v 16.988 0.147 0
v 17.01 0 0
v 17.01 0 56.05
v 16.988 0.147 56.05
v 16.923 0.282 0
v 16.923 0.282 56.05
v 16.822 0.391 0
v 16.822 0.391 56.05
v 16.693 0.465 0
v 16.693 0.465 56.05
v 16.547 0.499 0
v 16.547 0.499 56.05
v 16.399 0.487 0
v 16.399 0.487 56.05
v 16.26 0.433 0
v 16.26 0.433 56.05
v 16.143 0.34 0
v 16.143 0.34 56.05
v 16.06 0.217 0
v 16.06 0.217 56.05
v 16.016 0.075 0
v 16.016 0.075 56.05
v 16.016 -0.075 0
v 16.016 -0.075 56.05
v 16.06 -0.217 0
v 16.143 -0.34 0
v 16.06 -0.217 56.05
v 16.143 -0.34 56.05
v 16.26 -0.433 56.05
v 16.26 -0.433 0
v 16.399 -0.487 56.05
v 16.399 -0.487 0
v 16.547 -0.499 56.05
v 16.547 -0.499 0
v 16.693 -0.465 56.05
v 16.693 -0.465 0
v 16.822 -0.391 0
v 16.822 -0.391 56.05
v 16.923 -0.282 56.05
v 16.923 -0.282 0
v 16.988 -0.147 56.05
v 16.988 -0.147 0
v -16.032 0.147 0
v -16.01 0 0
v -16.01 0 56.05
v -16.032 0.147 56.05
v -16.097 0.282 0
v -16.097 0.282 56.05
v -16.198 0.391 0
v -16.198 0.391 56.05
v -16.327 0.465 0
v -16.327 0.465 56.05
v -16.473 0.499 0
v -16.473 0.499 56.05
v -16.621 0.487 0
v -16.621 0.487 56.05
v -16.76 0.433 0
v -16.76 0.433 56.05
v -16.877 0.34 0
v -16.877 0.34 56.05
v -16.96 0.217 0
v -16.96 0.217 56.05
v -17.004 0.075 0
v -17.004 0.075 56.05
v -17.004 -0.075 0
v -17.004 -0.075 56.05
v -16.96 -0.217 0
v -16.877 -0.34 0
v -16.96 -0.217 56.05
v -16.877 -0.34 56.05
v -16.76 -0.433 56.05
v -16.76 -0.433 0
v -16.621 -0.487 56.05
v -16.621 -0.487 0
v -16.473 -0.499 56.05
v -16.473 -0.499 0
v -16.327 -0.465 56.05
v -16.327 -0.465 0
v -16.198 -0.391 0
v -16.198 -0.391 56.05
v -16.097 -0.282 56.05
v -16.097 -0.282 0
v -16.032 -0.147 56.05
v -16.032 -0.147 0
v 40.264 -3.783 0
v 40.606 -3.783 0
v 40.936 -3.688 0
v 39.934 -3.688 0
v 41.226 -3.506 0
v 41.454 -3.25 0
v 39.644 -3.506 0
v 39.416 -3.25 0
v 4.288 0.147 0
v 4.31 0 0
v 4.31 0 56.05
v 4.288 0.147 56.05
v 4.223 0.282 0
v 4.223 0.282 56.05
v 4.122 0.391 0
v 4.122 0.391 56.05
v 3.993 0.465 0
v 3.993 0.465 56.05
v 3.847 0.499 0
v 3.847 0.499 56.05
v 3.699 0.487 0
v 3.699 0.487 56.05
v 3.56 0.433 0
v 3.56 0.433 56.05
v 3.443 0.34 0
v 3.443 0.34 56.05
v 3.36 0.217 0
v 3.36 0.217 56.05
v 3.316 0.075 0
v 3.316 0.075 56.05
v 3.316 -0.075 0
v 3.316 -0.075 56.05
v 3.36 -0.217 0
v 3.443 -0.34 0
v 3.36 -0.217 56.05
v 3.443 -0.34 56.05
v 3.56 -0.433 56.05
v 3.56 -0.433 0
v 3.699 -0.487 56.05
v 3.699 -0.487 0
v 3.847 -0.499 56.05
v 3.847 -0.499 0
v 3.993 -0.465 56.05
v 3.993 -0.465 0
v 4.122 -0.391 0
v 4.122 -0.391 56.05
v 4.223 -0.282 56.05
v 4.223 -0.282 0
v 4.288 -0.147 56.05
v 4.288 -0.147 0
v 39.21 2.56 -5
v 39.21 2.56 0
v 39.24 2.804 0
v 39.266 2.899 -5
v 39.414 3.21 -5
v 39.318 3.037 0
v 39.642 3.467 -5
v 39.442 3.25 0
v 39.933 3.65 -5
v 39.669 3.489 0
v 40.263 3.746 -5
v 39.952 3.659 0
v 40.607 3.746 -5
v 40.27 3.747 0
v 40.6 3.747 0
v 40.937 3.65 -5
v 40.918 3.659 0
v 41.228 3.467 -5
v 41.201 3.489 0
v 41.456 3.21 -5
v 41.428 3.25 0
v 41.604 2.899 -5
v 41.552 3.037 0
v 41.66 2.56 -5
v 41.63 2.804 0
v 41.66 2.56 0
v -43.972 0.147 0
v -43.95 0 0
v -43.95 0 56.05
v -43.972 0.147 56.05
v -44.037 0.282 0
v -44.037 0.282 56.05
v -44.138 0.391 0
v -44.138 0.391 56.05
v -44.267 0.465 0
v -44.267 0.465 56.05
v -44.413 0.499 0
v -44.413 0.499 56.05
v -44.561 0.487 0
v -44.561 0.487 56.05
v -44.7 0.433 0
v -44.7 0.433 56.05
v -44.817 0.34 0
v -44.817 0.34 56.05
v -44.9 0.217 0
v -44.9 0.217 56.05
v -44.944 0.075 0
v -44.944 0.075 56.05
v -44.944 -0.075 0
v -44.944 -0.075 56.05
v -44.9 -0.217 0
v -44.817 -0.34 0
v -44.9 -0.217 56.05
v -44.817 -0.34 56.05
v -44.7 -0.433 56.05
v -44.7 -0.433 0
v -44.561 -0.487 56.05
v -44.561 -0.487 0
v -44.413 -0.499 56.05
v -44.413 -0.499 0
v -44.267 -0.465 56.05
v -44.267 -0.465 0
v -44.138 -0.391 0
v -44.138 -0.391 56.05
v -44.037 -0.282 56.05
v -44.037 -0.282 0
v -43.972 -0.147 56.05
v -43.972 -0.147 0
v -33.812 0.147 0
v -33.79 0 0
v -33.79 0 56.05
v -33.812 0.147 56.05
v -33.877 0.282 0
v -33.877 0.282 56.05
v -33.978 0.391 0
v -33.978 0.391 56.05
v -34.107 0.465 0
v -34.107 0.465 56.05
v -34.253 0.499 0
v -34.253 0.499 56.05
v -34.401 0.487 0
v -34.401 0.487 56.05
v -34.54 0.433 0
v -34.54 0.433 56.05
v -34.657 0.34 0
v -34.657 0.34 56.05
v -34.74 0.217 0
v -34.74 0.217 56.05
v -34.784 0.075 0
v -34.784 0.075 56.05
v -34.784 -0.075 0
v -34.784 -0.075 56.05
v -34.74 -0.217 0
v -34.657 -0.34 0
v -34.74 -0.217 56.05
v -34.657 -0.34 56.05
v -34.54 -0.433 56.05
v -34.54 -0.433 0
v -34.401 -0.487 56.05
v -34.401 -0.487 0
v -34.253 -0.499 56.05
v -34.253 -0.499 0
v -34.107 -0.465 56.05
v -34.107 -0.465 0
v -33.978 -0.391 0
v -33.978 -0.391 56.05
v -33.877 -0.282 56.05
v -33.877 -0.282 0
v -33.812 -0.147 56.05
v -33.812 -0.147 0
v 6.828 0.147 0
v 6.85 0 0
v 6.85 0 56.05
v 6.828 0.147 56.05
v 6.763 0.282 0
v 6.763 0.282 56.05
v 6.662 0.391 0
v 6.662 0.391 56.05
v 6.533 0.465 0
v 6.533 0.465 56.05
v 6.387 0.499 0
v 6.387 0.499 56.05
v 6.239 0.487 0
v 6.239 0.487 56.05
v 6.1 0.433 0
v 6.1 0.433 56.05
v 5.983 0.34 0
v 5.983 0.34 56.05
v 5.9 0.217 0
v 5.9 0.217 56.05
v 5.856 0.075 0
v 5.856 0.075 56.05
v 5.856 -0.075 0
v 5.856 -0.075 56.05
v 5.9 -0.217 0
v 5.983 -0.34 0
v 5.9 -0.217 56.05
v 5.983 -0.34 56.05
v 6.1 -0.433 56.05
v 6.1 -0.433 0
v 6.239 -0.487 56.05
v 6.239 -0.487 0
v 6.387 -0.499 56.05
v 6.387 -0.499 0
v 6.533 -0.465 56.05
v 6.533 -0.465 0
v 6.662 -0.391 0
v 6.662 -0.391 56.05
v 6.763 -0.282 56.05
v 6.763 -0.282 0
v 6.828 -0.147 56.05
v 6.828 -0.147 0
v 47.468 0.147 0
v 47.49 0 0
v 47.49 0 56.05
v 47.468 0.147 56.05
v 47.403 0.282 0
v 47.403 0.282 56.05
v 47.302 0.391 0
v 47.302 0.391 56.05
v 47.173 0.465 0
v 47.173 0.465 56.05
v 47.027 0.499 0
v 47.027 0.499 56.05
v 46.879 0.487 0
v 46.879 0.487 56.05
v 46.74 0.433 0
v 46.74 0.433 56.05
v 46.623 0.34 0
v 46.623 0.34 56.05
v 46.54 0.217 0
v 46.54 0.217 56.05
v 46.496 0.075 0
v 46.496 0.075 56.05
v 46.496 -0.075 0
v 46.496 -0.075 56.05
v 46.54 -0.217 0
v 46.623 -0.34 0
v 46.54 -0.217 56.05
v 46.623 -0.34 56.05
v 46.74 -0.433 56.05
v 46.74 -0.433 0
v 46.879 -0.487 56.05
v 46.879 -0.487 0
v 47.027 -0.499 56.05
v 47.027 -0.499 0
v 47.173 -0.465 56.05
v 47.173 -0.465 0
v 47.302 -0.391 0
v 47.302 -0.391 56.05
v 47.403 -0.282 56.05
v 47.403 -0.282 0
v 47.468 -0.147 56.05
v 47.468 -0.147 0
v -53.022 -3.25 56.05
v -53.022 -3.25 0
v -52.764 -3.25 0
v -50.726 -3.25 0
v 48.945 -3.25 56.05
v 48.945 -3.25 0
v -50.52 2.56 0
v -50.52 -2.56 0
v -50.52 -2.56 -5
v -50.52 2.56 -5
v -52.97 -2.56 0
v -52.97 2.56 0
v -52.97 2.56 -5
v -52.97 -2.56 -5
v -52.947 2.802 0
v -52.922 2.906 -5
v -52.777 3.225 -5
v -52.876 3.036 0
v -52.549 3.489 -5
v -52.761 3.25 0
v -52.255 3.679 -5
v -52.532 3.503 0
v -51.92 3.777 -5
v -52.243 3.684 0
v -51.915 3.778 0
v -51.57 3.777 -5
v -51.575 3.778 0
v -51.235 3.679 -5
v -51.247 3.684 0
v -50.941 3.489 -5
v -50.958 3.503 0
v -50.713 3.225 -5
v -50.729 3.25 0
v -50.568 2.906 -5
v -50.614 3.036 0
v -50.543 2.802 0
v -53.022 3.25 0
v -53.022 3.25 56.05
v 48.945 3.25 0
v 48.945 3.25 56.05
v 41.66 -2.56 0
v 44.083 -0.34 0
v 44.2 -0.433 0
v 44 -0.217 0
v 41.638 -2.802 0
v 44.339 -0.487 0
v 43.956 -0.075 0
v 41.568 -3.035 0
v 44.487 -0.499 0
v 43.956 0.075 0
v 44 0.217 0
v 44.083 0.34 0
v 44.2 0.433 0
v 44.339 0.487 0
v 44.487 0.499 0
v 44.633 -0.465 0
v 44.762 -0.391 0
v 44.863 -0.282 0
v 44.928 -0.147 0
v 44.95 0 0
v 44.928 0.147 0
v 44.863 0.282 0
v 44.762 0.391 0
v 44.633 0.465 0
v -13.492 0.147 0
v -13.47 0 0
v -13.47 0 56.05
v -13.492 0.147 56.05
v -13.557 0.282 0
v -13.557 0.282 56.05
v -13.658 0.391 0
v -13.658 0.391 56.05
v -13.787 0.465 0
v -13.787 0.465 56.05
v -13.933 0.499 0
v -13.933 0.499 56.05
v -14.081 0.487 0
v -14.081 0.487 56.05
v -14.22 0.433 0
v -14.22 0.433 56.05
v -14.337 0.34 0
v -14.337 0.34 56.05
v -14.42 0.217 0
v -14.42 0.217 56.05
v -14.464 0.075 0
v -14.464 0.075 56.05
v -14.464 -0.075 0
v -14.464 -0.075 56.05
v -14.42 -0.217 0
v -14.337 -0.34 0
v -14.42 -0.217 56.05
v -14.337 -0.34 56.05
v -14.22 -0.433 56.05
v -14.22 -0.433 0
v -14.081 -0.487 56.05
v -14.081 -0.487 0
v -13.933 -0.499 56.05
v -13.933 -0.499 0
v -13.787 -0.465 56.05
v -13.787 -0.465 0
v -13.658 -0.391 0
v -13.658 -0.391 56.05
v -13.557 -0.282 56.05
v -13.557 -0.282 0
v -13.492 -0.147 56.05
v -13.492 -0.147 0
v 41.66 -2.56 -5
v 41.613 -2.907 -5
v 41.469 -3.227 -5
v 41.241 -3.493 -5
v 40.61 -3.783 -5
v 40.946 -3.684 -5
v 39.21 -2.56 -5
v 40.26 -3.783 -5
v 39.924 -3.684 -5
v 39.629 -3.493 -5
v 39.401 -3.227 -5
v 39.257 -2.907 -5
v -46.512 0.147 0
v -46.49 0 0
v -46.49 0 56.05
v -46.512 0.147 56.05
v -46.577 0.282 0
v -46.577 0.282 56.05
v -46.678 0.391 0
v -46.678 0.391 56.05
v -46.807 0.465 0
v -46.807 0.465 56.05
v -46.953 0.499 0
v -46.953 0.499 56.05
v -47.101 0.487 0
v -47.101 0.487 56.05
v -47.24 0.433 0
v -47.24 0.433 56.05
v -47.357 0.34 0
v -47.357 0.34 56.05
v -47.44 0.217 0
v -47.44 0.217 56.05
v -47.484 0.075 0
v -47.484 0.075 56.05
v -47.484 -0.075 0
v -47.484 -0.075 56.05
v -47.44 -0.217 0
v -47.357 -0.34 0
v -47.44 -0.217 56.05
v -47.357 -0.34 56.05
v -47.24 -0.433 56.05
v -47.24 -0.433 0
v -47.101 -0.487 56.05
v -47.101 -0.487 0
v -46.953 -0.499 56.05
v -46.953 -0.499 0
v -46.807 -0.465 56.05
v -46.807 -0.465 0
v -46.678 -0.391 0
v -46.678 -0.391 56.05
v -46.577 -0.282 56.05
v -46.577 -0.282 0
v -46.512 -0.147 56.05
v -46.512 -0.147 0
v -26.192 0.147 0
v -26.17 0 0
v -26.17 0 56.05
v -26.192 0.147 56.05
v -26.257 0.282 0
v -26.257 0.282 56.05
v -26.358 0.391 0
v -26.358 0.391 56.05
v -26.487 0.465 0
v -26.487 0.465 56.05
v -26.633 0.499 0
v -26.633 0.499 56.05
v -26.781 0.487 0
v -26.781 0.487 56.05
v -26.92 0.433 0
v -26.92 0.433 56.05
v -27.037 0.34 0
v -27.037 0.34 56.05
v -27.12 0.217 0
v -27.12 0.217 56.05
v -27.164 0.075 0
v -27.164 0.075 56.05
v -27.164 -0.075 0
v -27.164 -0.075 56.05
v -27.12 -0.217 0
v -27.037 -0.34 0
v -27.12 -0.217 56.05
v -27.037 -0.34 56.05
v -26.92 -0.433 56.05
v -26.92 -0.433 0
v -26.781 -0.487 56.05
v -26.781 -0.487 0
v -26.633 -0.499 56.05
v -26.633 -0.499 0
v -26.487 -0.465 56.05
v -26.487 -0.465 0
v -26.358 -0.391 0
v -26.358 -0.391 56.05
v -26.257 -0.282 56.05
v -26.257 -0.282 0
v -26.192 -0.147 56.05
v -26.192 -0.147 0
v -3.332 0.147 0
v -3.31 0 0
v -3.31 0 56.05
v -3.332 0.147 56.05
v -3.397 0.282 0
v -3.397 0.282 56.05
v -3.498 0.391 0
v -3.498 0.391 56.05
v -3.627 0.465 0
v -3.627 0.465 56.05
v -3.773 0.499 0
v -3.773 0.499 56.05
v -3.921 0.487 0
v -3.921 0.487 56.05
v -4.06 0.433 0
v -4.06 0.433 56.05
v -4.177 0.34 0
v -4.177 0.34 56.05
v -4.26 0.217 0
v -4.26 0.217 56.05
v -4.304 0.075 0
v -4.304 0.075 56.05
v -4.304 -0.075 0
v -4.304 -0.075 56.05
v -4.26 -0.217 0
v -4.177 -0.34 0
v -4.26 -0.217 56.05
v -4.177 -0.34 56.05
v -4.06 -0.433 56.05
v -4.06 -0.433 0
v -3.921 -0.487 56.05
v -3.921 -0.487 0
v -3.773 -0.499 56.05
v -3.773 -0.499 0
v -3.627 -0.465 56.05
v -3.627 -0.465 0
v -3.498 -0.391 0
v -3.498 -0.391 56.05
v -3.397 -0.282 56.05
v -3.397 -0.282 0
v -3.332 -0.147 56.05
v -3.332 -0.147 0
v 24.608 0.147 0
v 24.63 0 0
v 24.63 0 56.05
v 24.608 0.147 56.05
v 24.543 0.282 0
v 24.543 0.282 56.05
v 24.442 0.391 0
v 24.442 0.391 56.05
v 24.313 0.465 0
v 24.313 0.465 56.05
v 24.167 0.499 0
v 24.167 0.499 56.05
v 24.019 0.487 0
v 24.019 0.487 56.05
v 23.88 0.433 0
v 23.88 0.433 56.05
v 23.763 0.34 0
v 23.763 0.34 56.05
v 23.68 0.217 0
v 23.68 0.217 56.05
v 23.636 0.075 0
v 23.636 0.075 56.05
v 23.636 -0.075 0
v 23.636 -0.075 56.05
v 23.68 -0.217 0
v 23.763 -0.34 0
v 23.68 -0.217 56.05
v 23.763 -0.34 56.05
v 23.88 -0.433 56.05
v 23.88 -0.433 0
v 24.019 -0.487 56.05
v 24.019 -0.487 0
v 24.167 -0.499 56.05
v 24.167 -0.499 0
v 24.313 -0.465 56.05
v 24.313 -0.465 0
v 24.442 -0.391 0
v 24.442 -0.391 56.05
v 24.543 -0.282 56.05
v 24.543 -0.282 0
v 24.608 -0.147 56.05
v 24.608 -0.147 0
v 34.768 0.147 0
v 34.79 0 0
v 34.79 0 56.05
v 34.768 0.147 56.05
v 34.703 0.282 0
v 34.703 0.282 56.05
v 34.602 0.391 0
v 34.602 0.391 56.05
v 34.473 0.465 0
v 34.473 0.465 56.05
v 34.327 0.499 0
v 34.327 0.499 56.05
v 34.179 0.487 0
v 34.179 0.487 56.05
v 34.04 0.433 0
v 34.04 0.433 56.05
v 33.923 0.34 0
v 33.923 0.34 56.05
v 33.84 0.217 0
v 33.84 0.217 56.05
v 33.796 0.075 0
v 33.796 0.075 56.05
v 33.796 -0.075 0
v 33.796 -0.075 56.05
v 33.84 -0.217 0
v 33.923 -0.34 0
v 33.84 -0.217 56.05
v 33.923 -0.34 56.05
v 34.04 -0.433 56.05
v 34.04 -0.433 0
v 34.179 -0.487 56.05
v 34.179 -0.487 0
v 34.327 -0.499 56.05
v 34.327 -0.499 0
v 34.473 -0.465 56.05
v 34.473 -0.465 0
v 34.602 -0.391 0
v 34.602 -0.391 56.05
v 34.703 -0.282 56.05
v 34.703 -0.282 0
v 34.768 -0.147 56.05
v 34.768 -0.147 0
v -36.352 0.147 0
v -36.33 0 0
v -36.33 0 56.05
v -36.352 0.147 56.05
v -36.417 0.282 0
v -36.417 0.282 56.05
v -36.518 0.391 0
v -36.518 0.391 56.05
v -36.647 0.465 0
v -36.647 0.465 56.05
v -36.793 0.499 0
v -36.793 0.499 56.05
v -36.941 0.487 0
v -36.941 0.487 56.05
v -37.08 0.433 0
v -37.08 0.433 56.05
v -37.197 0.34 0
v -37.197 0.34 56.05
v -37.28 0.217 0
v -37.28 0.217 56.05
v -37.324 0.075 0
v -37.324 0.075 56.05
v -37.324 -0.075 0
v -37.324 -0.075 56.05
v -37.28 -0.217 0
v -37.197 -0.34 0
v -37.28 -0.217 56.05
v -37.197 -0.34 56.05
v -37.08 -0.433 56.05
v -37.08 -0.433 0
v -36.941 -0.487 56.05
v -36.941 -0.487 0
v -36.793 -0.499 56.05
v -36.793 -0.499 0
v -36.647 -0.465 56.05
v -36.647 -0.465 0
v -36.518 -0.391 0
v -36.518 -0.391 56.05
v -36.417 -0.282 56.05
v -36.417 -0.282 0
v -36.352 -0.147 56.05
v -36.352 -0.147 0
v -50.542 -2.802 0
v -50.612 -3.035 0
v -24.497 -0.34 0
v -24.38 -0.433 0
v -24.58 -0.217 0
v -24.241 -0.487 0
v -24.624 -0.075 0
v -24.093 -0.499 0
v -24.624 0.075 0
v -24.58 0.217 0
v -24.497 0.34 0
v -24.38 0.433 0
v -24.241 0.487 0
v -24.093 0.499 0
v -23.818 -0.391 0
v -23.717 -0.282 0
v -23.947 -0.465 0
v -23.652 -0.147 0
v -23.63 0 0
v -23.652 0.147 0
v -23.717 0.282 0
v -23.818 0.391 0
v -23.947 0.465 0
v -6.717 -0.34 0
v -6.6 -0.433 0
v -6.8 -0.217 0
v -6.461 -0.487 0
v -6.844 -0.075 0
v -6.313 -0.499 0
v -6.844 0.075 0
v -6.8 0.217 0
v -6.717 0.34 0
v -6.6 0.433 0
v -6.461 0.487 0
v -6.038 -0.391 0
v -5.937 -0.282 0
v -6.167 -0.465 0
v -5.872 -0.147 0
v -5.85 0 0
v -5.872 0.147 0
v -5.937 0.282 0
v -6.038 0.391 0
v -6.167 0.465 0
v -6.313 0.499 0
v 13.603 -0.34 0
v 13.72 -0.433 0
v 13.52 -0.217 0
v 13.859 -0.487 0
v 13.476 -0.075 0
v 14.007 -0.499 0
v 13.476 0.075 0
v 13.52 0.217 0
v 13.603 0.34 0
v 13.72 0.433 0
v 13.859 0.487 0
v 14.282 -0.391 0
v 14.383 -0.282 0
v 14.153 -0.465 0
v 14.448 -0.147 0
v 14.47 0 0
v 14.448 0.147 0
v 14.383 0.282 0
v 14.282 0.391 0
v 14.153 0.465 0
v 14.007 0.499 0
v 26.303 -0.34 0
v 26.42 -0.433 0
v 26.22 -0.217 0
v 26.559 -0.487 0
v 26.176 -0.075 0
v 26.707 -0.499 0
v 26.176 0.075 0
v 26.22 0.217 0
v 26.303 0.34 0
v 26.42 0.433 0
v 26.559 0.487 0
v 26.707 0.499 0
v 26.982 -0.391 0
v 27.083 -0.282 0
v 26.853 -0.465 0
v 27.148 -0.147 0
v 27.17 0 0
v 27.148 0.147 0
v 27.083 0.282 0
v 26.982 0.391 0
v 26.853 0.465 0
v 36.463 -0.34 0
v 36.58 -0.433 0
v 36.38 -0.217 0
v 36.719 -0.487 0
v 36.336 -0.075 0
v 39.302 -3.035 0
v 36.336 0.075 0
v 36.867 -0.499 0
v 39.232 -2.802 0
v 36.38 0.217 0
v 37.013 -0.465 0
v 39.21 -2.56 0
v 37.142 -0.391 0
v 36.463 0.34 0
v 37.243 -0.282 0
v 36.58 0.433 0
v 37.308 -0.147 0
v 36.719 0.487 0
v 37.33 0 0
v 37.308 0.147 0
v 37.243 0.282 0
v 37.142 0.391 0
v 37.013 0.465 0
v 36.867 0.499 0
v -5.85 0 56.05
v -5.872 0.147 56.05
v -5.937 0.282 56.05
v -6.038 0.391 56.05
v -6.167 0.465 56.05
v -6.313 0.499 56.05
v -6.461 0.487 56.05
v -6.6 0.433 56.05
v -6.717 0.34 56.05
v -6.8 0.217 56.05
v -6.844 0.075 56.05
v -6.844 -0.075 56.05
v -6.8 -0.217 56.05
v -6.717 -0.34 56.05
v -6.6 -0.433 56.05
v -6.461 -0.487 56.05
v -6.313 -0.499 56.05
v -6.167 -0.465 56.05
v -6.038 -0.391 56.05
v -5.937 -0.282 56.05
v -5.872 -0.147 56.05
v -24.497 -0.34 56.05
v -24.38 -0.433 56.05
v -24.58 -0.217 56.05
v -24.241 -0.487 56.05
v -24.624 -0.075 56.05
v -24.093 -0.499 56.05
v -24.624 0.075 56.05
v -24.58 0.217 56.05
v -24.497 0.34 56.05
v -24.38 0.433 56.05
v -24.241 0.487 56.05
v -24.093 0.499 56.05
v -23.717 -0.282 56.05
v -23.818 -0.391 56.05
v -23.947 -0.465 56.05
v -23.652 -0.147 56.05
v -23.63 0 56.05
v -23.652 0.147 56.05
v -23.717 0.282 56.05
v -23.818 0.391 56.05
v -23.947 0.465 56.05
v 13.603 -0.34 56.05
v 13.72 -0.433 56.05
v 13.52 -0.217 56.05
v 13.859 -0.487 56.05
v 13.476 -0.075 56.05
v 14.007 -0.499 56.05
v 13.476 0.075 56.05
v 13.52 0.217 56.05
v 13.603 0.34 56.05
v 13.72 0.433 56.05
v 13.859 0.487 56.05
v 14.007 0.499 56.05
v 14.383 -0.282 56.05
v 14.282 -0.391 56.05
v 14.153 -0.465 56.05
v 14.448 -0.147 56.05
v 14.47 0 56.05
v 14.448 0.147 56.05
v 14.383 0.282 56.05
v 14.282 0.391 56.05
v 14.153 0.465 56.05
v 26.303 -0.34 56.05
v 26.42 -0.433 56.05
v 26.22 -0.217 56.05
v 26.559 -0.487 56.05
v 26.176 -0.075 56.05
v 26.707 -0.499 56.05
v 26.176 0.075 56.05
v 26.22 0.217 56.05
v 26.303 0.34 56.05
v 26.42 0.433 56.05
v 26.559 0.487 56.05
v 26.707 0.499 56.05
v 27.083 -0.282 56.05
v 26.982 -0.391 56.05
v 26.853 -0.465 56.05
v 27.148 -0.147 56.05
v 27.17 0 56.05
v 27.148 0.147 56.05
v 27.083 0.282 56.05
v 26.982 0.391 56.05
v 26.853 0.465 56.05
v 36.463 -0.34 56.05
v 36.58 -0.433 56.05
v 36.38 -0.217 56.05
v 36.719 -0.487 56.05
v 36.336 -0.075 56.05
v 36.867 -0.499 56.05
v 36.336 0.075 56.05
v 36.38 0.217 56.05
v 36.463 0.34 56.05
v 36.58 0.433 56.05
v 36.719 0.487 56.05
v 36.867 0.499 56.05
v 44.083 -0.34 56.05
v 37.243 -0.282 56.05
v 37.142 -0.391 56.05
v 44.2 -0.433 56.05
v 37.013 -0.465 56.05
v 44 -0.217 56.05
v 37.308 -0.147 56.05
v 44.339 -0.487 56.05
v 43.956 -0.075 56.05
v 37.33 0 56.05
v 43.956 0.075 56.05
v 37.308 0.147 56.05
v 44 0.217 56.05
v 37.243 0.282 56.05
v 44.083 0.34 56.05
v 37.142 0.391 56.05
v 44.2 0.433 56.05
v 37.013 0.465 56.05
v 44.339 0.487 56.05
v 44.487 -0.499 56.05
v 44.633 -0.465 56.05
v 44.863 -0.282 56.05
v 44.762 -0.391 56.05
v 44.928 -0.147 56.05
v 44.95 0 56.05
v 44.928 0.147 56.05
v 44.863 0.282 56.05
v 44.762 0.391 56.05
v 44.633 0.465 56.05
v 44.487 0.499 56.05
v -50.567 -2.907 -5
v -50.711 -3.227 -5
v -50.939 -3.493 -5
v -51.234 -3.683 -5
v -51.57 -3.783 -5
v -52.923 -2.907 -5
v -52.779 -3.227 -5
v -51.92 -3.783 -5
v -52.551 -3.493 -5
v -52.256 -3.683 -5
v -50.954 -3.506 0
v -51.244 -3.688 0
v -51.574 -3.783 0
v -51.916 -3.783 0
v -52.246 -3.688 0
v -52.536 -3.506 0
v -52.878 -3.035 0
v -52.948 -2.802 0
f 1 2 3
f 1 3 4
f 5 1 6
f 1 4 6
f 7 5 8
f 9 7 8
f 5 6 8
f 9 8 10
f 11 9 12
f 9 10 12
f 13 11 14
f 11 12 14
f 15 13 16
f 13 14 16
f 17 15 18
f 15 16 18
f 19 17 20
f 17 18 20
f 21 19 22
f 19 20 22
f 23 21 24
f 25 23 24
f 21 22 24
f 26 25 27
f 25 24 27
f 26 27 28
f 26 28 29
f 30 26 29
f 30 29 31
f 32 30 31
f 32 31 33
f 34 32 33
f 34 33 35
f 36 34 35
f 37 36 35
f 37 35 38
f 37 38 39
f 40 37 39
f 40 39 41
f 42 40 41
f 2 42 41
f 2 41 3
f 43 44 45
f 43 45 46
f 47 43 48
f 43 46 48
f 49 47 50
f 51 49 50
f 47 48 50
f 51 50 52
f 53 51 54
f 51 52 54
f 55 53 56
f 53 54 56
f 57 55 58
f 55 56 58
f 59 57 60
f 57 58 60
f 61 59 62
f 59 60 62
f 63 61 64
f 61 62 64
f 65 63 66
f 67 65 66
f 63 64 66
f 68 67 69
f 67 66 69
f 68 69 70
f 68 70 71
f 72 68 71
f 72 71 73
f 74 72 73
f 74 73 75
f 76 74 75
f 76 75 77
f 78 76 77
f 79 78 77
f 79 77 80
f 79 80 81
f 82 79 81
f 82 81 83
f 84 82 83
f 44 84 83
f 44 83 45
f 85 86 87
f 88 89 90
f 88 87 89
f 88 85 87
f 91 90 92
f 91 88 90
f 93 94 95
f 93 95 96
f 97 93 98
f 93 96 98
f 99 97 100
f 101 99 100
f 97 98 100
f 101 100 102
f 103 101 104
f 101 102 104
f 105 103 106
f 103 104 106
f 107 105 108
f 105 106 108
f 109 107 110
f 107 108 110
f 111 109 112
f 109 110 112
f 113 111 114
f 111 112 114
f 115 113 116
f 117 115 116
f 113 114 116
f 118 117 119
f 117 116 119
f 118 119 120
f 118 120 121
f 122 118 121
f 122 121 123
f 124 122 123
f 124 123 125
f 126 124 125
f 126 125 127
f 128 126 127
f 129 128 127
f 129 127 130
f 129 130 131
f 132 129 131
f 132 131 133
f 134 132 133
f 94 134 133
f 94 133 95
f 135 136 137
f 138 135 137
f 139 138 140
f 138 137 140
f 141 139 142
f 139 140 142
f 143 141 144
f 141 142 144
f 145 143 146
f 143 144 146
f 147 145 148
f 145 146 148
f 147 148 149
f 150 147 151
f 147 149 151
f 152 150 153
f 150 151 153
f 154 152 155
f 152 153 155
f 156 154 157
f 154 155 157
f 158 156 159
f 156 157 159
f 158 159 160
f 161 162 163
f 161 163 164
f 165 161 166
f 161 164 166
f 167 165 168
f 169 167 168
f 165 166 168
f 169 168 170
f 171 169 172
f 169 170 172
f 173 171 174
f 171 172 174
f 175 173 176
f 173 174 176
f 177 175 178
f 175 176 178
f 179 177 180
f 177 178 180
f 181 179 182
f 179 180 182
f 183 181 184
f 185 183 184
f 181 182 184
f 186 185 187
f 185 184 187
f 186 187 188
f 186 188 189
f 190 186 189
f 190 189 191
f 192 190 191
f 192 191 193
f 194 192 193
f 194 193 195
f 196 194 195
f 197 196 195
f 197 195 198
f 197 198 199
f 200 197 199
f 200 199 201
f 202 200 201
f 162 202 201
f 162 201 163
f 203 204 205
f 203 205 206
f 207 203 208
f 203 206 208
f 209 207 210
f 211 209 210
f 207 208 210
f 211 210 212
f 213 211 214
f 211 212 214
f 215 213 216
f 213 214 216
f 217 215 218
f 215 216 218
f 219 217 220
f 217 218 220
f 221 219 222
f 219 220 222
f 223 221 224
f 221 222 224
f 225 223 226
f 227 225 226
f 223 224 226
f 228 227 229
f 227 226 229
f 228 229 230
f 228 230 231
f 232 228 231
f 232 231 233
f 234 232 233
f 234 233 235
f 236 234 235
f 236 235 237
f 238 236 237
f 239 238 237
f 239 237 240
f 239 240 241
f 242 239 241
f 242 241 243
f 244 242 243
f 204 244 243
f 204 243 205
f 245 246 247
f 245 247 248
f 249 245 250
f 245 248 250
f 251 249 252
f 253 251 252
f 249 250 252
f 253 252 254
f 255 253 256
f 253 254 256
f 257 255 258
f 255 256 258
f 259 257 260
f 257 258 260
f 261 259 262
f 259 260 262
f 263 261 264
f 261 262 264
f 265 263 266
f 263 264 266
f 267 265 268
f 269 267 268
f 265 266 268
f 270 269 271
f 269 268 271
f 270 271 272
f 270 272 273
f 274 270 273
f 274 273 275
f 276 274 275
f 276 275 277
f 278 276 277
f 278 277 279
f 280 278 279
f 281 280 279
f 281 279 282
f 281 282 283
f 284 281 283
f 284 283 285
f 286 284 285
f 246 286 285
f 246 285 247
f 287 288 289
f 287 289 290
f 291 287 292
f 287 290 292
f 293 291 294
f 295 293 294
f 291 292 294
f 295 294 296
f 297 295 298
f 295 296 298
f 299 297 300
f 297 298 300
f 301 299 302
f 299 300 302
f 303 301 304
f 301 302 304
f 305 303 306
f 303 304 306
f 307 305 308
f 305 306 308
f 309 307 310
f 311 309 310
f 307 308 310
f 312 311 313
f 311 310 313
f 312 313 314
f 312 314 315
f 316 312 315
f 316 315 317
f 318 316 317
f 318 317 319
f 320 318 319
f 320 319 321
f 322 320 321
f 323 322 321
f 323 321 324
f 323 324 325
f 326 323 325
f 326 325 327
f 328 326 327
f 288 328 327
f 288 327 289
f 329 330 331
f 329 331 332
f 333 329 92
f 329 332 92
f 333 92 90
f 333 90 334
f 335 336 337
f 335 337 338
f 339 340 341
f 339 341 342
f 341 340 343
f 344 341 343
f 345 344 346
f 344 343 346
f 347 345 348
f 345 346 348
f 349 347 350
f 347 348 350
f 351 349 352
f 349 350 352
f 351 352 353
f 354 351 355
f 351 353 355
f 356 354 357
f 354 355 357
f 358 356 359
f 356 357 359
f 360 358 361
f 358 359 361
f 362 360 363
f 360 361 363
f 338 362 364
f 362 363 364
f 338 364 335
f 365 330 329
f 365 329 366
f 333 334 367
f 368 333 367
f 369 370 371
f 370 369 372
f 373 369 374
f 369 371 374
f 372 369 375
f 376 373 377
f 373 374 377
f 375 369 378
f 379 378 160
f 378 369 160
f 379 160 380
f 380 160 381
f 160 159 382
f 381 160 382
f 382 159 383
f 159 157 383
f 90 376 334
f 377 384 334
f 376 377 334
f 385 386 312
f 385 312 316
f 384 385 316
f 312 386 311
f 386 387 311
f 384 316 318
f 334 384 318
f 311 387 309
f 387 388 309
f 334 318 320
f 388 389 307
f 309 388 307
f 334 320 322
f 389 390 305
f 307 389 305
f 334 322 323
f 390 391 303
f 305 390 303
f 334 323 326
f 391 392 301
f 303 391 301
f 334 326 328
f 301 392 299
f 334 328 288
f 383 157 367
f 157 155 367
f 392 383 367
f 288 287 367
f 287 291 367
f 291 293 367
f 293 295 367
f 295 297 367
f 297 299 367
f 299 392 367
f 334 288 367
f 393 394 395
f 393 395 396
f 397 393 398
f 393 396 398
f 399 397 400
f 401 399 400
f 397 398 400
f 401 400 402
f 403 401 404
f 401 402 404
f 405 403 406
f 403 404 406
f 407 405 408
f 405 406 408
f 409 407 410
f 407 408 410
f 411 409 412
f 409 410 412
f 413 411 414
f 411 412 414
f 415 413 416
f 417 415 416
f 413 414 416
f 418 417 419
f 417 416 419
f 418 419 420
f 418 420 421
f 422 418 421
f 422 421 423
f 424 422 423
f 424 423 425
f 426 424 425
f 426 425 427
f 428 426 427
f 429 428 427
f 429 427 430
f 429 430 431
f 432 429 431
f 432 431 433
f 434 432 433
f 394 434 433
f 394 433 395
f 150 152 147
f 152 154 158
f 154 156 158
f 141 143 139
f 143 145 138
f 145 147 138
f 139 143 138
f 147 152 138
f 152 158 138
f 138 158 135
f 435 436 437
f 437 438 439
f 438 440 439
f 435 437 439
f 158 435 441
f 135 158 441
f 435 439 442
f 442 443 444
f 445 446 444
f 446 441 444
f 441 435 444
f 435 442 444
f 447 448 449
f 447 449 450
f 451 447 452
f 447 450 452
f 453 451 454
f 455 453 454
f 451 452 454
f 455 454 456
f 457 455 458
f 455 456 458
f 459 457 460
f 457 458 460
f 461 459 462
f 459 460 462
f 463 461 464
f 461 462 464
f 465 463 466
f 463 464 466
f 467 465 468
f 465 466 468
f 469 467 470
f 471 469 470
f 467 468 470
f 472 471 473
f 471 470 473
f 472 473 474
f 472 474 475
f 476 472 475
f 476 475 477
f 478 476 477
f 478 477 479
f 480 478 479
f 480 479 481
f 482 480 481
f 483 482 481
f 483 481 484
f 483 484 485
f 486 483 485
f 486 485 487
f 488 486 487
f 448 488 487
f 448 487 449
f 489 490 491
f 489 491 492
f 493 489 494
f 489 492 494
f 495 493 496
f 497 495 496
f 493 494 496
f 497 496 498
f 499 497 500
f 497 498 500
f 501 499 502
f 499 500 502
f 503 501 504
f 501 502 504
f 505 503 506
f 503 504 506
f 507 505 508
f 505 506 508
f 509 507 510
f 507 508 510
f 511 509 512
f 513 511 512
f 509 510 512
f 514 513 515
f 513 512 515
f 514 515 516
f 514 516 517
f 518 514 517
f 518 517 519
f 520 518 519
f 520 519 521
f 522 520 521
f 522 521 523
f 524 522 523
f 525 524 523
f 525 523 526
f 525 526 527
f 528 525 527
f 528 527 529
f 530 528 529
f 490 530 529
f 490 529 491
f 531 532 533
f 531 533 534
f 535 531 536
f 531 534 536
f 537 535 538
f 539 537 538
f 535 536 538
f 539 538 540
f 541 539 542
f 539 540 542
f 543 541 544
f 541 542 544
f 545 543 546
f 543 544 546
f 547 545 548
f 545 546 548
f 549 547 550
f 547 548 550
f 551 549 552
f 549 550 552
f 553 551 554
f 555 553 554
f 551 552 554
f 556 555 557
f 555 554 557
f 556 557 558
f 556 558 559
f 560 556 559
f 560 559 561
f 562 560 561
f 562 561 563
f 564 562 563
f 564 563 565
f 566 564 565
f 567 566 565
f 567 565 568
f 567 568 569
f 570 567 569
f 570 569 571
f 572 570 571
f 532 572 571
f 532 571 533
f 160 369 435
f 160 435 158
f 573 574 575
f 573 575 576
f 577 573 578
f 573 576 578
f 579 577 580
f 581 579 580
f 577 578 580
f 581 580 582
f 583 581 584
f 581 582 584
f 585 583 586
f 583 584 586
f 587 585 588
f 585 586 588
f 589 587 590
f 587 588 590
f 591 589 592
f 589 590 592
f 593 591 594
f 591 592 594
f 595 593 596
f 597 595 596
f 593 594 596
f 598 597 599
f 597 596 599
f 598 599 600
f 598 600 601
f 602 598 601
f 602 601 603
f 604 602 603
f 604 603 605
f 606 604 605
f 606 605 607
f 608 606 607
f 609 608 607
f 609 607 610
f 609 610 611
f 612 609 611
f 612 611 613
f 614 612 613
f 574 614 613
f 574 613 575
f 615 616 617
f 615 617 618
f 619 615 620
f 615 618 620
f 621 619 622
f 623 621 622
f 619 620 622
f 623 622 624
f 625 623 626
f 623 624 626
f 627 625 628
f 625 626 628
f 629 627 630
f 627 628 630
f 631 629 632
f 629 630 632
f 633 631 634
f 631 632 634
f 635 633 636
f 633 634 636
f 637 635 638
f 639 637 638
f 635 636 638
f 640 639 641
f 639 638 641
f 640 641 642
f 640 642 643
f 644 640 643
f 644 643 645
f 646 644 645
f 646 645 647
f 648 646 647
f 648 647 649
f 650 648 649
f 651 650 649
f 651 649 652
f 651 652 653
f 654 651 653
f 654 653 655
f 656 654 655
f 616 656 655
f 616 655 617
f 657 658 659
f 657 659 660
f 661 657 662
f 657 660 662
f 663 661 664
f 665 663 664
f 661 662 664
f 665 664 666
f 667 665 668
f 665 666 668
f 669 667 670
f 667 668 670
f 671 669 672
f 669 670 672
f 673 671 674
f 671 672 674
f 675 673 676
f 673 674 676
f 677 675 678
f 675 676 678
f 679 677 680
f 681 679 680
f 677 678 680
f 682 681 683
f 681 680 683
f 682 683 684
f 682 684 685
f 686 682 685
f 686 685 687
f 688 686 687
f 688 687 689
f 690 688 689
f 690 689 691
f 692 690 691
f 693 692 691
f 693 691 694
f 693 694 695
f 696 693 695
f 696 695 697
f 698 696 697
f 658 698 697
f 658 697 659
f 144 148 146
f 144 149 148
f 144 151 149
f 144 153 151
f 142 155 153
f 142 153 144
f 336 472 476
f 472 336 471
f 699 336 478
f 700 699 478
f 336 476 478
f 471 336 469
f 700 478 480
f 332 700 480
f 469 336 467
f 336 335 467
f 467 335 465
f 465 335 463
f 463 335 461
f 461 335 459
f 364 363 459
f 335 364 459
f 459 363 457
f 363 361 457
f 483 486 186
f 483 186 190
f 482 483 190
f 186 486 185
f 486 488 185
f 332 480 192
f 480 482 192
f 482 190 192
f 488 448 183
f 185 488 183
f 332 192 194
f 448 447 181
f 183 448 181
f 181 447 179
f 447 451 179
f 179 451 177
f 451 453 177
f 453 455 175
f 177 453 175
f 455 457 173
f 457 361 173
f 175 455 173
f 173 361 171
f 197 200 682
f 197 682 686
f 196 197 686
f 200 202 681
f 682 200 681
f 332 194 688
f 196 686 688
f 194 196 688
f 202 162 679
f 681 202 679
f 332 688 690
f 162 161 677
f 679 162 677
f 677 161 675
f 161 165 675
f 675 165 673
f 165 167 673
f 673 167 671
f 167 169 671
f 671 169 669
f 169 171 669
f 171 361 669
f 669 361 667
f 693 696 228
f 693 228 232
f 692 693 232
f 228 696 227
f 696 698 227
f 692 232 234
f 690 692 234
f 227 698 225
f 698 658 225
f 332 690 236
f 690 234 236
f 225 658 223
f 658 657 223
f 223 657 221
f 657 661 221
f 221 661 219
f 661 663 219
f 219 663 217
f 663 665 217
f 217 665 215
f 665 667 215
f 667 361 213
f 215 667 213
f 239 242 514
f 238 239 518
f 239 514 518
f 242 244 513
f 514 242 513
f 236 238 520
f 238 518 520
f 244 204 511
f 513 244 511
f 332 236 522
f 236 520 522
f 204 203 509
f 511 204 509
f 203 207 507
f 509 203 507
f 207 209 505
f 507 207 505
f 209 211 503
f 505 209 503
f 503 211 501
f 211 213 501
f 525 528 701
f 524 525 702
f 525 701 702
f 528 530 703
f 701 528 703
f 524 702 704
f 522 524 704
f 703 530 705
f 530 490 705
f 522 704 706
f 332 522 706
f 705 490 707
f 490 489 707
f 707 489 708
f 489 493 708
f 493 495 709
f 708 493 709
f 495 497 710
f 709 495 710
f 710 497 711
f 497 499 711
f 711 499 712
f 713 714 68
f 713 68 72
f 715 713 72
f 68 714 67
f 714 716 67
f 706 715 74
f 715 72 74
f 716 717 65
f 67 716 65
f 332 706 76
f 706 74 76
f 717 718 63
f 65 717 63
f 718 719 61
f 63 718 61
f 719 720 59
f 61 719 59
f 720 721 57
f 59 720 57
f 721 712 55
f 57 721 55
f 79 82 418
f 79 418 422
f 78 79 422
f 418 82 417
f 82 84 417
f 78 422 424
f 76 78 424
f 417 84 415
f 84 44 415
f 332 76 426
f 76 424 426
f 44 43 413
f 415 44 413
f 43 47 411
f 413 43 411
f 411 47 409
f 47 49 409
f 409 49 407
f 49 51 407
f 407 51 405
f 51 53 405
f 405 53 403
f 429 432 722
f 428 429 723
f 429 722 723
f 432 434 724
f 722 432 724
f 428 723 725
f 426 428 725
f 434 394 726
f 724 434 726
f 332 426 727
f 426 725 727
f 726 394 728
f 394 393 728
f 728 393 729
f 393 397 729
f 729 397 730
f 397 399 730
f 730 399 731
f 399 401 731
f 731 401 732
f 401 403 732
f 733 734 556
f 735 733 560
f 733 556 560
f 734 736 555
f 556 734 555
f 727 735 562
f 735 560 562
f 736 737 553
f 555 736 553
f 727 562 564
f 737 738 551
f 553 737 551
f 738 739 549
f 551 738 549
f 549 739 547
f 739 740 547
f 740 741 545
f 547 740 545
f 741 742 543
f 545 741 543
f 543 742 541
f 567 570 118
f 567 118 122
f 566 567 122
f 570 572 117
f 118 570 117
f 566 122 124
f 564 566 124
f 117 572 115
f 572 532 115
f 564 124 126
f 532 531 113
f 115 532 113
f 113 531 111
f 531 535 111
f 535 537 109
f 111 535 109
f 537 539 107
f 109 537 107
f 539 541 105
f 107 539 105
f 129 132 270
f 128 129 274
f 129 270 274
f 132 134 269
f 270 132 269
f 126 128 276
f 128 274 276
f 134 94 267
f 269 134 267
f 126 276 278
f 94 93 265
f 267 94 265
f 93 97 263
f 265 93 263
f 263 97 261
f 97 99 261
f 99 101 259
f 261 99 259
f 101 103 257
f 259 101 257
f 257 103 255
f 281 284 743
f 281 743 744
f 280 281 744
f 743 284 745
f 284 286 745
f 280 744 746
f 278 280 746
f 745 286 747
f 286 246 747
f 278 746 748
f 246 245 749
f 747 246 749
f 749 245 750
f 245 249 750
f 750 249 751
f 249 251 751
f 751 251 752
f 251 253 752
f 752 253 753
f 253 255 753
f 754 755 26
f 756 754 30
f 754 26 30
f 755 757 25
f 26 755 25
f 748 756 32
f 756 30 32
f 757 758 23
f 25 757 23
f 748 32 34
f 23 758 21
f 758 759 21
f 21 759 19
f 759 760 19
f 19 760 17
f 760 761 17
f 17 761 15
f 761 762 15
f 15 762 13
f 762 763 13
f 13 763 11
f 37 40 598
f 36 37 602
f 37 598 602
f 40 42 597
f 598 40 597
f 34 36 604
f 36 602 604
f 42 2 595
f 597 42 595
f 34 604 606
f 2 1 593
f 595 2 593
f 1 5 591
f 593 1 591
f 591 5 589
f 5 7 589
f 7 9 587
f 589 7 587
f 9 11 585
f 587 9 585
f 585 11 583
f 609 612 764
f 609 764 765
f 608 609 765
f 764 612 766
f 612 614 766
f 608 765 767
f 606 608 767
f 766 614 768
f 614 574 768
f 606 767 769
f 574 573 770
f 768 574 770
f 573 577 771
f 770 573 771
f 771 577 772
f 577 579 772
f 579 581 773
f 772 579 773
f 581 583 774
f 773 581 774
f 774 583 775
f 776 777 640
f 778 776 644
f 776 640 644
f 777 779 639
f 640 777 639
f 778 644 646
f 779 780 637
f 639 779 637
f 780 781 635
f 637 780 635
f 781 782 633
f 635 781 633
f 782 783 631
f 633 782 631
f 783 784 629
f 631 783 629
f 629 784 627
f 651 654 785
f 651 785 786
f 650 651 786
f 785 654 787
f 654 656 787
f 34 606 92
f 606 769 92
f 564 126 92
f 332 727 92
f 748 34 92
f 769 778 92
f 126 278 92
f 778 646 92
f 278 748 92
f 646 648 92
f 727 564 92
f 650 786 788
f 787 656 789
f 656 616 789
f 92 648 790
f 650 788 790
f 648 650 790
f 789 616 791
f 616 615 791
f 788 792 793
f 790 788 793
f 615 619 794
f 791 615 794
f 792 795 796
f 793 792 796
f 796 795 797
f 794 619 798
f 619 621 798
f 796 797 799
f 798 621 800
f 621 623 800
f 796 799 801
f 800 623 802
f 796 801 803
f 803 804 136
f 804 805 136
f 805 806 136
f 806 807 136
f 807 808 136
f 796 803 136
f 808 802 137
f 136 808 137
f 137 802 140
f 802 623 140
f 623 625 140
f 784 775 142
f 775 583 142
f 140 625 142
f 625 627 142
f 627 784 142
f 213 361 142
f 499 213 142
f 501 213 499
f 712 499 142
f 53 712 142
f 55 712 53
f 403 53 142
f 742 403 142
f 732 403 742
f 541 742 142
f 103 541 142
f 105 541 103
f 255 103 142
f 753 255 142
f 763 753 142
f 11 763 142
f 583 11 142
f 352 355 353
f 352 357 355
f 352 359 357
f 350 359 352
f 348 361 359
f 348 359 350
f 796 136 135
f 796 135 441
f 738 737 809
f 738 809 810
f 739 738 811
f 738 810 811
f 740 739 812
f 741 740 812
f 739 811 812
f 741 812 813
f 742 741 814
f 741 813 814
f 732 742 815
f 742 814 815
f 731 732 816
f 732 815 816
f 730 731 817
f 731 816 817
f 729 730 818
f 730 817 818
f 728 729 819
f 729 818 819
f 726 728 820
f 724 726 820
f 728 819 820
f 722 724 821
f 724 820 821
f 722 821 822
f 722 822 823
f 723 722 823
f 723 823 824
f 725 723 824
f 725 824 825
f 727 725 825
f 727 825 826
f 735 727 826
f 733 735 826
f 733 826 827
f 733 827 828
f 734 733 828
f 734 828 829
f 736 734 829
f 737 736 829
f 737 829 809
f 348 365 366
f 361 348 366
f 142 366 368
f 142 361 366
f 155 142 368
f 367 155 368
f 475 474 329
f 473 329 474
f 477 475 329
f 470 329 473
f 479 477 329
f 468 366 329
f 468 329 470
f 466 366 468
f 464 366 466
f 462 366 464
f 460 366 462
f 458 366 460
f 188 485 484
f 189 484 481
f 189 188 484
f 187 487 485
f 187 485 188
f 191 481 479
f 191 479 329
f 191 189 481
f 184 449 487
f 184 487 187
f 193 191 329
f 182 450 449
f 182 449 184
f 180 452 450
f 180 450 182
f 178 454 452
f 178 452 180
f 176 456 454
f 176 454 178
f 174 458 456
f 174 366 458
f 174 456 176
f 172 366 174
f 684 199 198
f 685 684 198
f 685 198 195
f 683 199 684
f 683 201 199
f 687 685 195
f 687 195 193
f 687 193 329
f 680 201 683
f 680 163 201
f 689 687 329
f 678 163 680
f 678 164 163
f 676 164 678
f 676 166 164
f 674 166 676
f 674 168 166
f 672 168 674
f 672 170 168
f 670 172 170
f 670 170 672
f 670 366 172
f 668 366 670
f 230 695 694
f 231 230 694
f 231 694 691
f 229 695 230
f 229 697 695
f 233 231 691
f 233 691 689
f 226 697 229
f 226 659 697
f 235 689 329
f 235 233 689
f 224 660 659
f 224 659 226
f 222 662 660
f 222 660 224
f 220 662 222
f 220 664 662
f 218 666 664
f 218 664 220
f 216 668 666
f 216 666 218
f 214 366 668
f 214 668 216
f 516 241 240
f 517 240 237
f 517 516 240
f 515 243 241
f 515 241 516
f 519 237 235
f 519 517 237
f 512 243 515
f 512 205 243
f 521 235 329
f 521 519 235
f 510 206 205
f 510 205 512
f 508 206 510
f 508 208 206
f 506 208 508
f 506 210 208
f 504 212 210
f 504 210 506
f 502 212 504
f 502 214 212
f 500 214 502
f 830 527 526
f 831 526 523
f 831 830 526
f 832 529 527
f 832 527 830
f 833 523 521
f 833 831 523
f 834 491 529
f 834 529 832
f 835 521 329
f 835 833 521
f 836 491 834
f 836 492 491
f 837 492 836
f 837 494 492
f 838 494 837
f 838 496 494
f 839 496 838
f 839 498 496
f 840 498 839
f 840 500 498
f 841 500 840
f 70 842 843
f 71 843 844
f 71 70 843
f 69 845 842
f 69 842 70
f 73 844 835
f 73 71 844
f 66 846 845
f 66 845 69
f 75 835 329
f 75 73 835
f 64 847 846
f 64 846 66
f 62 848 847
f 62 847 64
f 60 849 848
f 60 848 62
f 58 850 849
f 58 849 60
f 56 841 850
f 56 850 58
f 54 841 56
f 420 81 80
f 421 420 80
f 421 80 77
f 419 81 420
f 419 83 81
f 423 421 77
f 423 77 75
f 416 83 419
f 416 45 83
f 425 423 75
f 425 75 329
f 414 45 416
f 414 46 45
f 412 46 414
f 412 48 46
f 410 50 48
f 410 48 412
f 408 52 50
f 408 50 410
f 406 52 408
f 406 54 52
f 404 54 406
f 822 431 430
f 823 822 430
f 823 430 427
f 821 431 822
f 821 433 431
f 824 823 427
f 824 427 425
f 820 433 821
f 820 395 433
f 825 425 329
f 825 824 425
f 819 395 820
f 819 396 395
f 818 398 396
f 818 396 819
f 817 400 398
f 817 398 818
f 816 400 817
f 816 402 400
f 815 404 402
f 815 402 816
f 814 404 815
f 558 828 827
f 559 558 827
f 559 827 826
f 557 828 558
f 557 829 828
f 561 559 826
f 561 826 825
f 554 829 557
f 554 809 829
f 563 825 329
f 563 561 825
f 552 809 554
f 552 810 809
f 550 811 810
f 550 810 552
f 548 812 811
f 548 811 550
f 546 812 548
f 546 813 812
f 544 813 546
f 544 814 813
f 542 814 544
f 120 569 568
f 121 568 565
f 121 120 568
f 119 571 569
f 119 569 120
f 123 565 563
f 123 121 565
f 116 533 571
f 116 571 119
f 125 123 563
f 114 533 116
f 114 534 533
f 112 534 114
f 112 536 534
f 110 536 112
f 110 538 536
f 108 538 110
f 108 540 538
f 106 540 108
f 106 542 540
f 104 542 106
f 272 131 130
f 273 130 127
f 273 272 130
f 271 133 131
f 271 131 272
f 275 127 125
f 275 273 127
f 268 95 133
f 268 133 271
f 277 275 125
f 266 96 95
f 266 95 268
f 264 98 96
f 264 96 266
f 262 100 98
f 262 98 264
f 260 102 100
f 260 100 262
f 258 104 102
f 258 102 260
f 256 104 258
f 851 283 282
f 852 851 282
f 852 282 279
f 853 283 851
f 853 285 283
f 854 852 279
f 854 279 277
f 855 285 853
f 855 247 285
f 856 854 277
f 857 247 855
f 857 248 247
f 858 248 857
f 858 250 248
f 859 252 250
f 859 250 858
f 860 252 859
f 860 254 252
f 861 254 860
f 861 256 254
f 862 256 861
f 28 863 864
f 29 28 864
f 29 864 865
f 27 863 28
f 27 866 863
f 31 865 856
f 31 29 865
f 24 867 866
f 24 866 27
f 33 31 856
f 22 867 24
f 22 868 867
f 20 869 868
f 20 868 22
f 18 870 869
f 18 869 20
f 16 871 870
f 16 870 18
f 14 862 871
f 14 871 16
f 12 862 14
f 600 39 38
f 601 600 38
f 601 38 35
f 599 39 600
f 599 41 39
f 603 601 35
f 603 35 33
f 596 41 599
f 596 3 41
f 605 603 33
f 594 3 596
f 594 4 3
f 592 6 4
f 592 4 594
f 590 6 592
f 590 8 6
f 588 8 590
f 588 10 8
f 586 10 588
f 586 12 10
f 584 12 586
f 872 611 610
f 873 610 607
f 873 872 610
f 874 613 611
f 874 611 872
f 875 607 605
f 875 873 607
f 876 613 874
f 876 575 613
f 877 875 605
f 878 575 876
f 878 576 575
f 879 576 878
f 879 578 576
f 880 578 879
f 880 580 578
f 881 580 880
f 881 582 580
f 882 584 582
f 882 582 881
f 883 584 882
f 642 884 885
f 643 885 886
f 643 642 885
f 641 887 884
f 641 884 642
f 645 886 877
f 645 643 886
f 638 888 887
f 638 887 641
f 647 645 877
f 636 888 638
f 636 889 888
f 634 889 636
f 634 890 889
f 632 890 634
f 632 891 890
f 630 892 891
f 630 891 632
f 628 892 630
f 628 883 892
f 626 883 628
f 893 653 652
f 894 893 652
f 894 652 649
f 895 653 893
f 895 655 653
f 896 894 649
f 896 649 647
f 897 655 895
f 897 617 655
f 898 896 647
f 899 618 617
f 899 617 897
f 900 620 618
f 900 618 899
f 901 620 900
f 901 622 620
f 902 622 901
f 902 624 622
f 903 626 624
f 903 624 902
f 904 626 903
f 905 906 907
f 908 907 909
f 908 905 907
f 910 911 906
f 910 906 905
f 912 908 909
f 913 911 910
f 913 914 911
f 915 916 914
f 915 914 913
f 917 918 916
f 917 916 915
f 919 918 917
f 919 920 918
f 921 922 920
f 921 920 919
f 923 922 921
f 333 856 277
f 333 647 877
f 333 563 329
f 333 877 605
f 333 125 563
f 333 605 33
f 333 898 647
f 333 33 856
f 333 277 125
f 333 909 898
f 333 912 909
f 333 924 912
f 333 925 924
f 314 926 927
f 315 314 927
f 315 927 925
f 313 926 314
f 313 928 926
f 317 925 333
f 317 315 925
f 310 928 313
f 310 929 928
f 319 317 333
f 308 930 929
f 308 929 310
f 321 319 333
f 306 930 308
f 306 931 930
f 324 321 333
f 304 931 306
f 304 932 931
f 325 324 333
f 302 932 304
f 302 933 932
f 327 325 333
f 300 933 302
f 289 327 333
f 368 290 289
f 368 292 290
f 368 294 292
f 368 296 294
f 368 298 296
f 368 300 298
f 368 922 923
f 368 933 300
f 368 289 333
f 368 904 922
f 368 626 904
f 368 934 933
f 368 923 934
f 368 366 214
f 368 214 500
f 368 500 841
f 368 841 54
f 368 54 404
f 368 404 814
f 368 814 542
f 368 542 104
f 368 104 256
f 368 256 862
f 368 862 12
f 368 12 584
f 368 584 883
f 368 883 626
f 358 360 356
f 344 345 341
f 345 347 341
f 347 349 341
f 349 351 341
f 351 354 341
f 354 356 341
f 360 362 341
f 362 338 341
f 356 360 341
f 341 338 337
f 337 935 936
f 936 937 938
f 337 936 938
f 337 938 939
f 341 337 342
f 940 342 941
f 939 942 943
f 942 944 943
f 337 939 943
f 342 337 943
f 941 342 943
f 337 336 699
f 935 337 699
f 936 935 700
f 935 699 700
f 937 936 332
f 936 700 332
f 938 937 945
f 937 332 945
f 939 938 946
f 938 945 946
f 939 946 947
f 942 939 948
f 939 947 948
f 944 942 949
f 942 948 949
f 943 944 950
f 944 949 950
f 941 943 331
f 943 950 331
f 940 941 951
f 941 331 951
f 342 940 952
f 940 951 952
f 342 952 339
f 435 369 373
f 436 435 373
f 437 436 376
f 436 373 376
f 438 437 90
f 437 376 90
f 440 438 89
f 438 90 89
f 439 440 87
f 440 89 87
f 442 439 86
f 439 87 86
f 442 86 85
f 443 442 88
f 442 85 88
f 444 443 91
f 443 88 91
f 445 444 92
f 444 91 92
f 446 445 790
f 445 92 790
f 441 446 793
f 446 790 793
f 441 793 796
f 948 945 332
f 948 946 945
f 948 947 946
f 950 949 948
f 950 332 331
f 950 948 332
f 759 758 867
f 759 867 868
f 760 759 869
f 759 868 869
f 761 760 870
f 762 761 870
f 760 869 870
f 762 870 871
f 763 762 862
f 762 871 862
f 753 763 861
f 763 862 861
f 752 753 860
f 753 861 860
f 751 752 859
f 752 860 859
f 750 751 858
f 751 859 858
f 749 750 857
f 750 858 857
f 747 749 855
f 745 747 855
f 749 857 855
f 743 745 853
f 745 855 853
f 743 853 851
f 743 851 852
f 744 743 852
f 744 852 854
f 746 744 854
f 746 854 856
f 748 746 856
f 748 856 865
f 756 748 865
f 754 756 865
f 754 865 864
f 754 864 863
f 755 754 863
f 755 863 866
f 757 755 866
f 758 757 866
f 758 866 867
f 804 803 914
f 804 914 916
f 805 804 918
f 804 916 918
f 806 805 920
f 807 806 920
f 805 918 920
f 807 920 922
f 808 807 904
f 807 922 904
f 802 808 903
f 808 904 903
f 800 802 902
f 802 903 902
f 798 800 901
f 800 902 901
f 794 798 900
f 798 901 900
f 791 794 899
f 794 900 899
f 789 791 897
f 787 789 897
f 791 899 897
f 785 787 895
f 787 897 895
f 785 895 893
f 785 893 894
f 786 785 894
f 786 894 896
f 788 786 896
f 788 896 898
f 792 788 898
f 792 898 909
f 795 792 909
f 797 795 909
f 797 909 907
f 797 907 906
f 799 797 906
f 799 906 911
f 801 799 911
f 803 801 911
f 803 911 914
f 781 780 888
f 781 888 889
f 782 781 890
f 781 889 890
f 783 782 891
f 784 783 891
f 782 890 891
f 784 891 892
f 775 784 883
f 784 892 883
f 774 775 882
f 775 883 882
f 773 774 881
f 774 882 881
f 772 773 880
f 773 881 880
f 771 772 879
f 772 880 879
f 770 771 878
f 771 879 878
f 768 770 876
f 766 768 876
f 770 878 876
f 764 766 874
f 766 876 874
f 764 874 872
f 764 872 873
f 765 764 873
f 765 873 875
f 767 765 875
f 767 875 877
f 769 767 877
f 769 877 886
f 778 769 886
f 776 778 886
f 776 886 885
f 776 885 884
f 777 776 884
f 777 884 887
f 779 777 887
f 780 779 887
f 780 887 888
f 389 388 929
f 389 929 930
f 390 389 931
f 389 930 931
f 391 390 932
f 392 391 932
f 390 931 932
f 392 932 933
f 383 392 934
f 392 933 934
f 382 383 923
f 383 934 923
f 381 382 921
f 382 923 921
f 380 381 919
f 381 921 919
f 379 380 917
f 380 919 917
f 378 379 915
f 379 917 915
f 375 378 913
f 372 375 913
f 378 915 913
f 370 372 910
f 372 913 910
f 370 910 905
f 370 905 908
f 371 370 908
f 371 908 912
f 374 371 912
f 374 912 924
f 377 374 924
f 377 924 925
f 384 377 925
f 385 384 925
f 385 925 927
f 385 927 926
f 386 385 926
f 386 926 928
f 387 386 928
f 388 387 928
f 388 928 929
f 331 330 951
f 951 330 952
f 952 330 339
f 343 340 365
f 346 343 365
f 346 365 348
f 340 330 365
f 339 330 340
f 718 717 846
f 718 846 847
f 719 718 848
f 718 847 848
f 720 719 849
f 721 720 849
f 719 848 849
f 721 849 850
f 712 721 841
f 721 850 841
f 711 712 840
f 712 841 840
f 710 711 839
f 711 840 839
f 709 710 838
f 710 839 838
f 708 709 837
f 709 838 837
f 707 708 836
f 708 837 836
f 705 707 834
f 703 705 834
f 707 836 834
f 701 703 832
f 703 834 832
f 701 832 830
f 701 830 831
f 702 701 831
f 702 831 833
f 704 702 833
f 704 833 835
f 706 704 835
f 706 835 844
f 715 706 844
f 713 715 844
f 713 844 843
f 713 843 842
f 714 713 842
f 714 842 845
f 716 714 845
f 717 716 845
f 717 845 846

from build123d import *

# Parameters (mm, degrees)
SKETCH_W     = 101.9675
SKETCH_H     = 6.5
PAD_DEPTH    = 56.05
SKETCH001_R  = 0.5
POCKET_DEPTH = 70
PAD001_DEPTH = 5


with BuildPart() as part:
    # Sketch → Pad (new body)
    with BuildSketch(Plane.XY):
        with Locations((-2.03875, 0)):
            Rectangle(SKETCH_W, SKETCH_H)
    extrude(amount=PAD_DEPTH)

    # Sketch001 (on Face6 of Pad) → Pocket (cut)
    with BuildSketch(Plane.XY.offset(56.05)):
        with Locations((3.81, 0)):
            Circle(SKETCH001_R)
        with Locations((6.35, 0)):
            Circle(SKETCH001_R)
        with Locations((-16.51, 0)):
            Circle(SKETCH001_R)
        with Locations((-13.97, 0)):
            Circle(SKETCH001_R)
        with Locations((-34.29, 0)):
            Circle(SKETCH001_R)
        with Locations((-36.83, 0)):
            Circle(SKETCH001_R)
        with Locations((13.97, 0)):
            Circle(SKETCH001_R)
        with Locations((16.51, 0)):
            Circle(SKETCH001_R)
        with Locations((24.13, 0)):
            Circle(SKETCH001_R)
        with Locations((26.67, 0)):
            Circle(SKETCH001_R)
        with Locations((34.29, 0)):
            Circle(SKETCH001_R)
        with Locations((36.83, 0)):
            Circle(SKETCH001_R)
        with Locations((44.45, 0)):
            Circle(SKETCH001_R)
        with Locations((46.99, 0)):
            Circle(SKETCH001_R)
        with Locations((-46.99, 0)):
            Circle(SKETCH001_R)
        with Locations((-44.45, 0)):
            Circle(SKETCH001_R)
        with Locations((-26.67, 0)):
            Circle(SKETCH001_R)
        with Locations((-24.13, 0)):
            Circle(SKETCH001_R)
        with Locations((-6.35, 0)):
            Circle(SKETCH001_R)
        with Locations((-3.81, 0)):
            Circle(SKETCH001_R)
    extrude(amount=-POCKET_DEPTH, mode=Mode.SUBTRACT)

    # Sketch002 (on Face4 of Pocket) → Pad001 (join)
    with BuildSketch(Plane(origin=(0, 0, 0), x_dir=(1, 0, 0), z_dir=(0, 0, -1))):
        with BuildLine():
            Line((-50.52, 2.56), (-50.52, -2.56))
            ThreePointArc((-52.97, -2.56), (-51.745, -3.789911), (-50.52, -2.56))
            Line((-52.97, -2.56), (-52.97, 2.56))
            ThreePointArc((-50.52, 2.56), (-51.745, 3.795206), (-52.97, 2.56))
        make_face()
        with BuildLine():
            Line((41.66, 2.56), (41.66, -2.56))
            ThreePointArc((39.21, -2.56), (40.435, -3.757758), (41.66, -2.56))
            Line((39.21, -2.56), (39.21, 2.56))
            ThreePointArc((41.66, 2.56), (40.435, 3.795415), (39.21, 2.56))
        make_face()
    extrude(amount=PAD001_DEPTH)


solid = part.part
